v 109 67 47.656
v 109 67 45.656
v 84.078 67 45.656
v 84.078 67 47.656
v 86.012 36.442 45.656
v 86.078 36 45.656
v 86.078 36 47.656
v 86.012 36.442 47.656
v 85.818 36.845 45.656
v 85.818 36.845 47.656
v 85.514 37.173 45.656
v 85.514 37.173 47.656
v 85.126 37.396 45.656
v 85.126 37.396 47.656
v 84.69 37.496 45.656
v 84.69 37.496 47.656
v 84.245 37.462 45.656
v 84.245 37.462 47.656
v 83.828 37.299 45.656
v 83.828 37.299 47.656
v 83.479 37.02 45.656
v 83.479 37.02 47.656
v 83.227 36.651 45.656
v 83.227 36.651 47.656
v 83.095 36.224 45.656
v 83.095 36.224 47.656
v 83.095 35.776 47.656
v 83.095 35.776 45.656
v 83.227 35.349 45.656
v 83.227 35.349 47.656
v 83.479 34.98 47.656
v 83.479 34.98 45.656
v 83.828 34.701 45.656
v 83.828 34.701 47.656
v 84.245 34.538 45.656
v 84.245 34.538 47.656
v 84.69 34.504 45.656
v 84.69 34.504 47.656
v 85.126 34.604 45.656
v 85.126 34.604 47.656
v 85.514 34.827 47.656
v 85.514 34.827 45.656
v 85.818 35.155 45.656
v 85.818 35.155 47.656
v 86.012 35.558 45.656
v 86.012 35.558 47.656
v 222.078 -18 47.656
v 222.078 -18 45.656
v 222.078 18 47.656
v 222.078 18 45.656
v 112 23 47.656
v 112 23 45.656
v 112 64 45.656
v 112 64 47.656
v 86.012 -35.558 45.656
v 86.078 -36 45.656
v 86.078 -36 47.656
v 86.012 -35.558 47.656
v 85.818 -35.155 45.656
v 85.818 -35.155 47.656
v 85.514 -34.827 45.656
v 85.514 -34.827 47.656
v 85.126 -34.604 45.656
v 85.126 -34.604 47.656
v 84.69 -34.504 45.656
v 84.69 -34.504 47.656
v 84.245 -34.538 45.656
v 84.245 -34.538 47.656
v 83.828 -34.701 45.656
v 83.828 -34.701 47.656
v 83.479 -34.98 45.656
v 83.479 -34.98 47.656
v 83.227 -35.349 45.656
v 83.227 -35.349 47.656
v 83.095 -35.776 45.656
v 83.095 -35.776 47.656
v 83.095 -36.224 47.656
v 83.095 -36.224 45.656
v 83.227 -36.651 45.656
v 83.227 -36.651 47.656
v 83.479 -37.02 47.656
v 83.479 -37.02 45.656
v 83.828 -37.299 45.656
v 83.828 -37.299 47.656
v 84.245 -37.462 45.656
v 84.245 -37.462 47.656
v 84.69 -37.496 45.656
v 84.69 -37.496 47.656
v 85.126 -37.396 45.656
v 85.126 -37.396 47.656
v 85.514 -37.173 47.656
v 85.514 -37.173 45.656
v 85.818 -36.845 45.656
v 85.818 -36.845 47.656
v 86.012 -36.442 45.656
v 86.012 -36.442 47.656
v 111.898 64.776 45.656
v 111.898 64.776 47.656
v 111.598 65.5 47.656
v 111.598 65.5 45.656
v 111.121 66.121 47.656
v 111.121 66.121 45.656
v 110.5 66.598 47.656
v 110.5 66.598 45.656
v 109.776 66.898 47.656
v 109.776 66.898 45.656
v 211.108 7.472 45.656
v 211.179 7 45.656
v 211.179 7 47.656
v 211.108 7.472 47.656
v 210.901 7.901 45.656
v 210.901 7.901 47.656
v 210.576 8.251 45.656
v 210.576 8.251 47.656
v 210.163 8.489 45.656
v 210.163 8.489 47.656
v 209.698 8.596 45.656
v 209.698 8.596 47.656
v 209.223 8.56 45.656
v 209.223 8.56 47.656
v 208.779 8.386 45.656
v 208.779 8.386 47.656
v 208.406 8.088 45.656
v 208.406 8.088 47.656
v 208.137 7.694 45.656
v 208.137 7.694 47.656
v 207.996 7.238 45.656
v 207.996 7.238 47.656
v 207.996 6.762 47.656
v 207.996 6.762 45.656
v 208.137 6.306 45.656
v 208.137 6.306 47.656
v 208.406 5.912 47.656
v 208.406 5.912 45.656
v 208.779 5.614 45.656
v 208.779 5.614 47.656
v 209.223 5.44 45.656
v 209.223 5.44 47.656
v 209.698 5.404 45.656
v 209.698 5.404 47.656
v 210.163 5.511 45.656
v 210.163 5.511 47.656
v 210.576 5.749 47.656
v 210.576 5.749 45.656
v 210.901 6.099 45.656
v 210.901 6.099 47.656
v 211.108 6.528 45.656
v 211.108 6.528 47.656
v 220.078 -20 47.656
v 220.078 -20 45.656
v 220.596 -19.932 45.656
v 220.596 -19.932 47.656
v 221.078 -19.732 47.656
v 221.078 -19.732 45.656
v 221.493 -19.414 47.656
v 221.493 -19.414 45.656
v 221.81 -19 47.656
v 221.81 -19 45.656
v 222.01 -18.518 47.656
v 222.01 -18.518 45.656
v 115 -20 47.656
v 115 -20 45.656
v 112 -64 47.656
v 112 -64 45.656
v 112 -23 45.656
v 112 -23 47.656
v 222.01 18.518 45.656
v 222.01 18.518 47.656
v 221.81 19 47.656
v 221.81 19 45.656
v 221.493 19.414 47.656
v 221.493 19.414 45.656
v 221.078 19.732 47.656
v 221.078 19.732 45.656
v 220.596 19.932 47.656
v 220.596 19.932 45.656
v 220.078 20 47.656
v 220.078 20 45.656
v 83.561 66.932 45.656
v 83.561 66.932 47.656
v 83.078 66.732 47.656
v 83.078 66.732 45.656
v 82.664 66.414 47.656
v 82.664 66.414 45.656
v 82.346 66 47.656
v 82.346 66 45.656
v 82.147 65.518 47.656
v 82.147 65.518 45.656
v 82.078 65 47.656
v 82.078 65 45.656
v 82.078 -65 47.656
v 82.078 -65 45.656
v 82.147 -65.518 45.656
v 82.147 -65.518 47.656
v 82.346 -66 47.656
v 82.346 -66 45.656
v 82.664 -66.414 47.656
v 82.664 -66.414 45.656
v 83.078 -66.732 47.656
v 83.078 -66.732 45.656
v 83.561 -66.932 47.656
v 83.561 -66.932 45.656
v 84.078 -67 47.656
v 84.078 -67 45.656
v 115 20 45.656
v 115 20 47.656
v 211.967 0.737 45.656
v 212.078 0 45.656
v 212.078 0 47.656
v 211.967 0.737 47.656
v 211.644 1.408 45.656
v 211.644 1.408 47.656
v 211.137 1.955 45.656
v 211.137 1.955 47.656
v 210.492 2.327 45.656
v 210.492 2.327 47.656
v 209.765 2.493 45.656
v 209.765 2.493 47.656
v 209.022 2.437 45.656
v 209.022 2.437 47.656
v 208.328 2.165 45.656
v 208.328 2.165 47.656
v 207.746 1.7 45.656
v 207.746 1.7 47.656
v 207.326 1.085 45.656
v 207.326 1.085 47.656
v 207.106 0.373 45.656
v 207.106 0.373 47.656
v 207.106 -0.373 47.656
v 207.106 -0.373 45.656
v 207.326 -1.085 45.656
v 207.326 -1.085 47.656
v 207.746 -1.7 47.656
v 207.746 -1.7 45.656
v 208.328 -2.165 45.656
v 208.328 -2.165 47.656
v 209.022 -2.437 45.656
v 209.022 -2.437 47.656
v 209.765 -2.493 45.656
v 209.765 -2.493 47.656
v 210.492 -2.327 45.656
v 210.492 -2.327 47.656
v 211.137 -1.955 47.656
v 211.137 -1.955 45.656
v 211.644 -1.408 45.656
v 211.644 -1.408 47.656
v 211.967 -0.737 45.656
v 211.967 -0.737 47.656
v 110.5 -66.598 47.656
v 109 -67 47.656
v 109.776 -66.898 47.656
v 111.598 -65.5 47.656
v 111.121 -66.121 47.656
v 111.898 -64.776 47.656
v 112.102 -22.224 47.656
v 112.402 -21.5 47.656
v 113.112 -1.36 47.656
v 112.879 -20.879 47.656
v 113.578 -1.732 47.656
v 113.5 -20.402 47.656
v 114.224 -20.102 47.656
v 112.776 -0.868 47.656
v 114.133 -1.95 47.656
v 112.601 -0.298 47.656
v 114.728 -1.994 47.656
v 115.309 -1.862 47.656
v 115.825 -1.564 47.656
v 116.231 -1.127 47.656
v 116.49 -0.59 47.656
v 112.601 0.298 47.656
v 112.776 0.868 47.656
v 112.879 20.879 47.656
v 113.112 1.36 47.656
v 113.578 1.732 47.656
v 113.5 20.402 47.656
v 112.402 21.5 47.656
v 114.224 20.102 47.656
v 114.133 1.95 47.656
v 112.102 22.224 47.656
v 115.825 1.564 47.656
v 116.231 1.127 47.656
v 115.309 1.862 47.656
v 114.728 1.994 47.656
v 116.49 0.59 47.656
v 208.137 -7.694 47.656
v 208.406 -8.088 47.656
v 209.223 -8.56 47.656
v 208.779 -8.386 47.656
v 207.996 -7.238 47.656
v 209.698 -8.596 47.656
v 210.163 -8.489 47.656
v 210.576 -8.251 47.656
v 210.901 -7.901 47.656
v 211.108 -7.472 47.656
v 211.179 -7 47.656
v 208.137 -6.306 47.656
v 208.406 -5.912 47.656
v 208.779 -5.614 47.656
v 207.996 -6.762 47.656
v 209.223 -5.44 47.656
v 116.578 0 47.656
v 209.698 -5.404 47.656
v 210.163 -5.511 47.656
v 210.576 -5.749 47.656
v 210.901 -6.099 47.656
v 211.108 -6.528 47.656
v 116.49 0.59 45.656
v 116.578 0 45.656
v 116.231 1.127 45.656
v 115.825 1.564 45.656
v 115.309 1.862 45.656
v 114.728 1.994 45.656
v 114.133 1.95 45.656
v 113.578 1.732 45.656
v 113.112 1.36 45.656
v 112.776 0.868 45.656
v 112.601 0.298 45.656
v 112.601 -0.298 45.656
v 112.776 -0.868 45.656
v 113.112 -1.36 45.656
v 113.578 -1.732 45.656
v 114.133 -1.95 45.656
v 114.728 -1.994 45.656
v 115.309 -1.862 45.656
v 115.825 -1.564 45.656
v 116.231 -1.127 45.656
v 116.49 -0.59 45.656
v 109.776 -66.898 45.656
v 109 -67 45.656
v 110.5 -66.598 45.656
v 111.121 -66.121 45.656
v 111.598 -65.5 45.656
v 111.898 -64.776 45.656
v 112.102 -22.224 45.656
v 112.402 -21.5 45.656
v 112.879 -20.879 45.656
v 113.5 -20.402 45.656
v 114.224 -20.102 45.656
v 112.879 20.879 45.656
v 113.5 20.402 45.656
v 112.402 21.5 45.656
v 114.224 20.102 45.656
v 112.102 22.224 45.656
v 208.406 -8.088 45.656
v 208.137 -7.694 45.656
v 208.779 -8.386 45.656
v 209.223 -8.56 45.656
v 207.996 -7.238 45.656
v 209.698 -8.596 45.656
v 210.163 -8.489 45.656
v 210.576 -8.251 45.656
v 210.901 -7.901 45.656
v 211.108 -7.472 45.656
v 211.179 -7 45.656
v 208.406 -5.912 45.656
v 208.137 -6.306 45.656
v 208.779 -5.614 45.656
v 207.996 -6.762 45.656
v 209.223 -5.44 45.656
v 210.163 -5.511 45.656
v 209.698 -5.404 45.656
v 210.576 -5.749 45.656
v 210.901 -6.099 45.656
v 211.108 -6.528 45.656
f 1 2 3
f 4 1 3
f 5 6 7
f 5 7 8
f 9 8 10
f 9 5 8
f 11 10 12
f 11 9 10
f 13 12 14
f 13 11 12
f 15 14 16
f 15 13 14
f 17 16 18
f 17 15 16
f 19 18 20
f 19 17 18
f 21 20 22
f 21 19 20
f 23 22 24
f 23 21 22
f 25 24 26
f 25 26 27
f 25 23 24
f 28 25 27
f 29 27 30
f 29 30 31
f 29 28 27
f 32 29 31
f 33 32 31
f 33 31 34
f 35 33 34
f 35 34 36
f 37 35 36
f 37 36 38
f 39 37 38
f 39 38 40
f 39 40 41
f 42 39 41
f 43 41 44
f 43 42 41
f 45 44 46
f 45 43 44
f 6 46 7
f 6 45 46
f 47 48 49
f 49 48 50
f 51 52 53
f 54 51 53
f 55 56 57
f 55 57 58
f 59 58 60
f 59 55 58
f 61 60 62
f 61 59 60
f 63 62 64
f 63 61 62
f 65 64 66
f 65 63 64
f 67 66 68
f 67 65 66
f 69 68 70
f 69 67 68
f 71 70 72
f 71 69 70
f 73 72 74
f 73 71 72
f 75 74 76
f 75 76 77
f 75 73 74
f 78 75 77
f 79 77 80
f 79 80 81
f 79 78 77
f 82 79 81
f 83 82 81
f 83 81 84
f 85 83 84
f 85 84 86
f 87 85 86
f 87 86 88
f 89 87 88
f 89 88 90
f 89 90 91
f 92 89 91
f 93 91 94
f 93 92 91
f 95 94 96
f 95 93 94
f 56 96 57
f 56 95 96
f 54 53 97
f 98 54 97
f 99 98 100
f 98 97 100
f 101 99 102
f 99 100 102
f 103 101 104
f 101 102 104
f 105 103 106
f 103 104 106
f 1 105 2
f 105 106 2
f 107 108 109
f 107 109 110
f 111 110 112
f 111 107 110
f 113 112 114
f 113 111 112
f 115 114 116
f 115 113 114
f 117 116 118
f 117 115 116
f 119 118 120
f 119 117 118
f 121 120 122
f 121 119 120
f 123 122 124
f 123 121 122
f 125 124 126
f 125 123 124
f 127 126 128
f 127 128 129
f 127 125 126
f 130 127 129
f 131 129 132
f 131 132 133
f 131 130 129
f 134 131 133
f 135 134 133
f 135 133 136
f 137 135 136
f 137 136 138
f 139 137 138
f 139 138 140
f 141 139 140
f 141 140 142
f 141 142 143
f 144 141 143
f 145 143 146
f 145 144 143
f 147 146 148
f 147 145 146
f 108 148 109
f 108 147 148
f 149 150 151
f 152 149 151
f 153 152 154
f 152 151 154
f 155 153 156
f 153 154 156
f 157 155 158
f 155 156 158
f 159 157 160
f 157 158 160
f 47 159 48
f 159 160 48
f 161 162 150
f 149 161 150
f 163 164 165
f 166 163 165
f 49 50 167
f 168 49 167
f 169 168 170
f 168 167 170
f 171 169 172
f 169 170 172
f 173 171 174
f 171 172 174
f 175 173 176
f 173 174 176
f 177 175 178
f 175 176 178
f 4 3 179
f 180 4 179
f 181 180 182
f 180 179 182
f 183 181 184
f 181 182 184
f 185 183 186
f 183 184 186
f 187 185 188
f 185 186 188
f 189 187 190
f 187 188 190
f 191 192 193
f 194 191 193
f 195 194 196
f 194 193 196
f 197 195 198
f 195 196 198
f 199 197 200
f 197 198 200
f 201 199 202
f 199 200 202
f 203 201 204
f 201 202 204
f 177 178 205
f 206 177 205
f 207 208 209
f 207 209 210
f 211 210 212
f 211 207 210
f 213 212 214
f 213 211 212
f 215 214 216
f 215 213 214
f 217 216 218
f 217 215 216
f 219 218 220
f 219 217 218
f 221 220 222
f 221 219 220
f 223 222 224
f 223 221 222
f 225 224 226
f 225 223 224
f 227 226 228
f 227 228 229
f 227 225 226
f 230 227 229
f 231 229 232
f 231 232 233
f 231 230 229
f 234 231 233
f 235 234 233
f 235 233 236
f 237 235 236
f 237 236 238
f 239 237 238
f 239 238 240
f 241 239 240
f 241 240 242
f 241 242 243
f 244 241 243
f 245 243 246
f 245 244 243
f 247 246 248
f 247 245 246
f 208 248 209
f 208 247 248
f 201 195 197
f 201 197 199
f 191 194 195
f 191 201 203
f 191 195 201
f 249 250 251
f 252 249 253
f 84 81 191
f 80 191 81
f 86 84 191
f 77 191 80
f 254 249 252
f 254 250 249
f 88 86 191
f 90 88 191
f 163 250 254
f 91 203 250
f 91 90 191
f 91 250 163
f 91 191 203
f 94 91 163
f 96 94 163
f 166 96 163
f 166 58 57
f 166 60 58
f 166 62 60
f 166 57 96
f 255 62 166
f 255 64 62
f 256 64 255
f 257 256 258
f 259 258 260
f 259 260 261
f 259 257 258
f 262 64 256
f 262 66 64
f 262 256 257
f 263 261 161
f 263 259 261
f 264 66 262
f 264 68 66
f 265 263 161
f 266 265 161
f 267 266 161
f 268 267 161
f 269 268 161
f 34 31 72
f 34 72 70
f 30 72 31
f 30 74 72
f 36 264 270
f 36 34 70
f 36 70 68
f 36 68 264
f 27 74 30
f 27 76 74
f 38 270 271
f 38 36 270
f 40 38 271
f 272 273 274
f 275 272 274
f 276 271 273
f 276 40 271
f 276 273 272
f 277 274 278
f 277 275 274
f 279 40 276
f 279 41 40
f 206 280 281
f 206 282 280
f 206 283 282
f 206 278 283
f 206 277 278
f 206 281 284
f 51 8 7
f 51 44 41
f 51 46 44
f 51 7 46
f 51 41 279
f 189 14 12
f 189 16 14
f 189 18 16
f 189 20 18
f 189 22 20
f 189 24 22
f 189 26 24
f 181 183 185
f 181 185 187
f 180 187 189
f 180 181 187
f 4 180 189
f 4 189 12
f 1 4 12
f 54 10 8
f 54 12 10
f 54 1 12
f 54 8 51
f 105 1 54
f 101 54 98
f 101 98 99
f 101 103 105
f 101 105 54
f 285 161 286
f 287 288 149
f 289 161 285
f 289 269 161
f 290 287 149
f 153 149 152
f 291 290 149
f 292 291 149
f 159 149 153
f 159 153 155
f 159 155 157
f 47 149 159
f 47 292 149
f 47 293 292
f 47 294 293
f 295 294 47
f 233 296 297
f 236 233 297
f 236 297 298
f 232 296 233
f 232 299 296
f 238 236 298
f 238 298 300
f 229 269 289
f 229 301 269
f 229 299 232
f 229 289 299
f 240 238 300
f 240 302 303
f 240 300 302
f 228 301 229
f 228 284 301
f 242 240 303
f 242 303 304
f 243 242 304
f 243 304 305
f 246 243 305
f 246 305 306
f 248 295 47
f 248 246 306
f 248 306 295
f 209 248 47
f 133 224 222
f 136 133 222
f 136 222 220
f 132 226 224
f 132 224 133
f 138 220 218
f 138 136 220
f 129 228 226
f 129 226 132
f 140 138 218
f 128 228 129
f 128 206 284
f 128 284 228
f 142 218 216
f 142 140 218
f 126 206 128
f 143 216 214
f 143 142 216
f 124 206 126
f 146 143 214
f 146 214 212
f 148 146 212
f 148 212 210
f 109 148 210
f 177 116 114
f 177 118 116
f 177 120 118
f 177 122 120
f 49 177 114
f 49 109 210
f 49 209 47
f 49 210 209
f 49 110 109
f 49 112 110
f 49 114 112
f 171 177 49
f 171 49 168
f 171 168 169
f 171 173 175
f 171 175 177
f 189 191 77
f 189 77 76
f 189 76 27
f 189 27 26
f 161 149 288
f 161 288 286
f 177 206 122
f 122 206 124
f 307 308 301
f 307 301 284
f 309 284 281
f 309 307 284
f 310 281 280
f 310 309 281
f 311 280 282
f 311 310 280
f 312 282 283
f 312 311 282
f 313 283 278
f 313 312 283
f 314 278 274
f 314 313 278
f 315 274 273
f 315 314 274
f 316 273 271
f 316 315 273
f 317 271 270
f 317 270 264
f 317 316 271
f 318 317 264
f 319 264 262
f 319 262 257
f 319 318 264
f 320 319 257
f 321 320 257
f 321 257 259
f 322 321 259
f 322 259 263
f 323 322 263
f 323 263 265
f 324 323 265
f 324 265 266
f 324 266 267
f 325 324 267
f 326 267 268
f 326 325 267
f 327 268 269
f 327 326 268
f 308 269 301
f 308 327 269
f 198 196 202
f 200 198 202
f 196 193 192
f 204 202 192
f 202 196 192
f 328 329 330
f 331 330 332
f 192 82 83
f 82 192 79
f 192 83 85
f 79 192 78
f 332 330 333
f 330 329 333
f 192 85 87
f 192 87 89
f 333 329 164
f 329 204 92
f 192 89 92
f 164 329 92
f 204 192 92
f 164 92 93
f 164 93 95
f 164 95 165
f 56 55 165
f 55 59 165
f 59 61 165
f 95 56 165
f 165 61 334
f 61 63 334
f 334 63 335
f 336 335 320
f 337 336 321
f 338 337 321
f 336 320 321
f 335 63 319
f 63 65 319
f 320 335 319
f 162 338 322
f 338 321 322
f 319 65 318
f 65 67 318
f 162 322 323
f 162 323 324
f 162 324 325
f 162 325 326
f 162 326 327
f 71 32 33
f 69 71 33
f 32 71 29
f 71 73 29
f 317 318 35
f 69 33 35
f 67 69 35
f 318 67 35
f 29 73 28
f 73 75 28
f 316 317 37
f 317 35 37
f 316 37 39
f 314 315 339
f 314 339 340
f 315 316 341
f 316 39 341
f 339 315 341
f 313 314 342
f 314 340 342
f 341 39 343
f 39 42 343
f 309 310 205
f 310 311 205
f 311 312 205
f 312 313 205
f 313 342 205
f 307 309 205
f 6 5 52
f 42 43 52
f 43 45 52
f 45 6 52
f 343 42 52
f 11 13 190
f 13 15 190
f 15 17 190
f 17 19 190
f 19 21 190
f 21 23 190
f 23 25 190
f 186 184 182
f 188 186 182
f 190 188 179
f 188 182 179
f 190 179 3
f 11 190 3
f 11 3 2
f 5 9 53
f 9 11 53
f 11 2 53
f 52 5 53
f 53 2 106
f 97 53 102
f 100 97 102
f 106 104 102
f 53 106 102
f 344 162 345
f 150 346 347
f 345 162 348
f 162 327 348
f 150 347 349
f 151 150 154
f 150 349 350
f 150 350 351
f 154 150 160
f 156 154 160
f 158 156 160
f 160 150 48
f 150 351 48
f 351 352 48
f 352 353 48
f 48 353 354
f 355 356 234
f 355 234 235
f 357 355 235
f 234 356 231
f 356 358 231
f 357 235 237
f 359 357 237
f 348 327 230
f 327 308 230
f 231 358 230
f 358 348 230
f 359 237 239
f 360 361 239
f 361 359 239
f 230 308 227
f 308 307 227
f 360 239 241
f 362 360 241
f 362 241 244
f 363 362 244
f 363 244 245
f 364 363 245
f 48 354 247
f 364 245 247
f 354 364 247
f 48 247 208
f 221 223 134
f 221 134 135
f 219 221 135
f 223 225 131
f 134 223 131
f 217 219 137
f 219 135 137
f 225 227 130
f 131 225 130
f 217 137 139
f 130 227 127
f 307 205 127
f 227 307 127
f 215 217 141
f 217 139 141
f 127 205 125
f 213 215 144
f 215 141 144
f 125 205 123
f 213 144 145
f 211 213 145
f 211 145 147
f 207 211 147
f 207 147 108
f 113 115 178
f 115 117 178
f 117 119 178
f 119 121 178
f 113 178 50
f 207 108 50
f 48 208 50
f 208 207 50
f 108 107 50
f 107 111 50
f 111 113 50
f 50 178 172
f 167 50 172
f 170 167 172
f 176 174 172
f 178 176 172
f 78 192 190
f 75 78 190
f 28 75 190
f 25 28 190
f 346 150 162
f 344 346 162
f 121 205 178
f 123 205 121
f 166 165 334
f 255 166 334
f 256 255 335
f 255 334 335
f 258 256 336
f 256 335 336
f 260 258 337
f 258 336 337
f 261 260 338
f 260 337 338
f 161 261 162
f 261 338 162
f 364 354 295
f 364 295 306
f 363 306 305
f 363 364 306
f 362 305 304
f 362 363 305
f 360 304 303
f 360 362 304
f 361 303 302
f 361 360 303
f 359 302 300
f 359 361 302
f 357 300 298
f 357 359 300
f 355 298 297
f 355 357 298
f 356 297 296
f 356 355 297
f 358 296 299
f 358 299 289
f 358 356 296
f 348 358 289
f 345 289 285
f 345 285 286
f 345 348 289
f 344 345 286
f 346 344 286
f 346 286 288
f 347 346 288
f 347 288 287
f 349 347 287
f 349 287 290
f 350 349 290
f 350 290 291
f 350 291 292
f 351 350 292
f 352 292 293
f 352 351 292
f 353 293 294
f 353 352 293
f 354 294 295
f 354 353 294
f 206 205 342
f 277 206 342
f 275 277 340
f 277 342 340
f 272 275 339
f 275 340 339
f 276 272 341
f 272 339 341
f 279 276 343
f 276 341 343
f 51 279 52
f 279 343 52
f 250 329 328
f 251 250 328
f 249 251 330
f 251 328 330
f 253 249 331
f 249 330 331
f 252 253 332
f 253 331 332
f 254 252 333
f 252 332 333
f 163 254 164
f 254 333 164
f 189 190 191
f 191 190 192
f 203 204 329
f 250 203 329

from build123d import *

# Parameters (mm, degrees)
EXTRUDE_1_DEPTH     = 2
SKETCH_2_R          = 2.5
SKETCH_2_R_2        = 2
SKETCH_2_R_3        = 1.5
CUT_EXTRUDE_1_DEPTH = 2
SKETCH_3_R          = 1.6
CUT_EXTRUDE_2_DEPTH = 2


with BuildPart() as part:
    # 草图1 → 凸台-拉伸1 (new body)
    with BuildSketch(Plane.XY.offset(45.656070911)):
        with BuildLine():
            Line((82.078378746, 65), (82.078378746, -65))
            ThreePointArc((82.078378746, -65), (82.664165184, -66.414213562), (84.078378746, -67))
            Line((84.078378746, -67), (109, -67))
            ThreePointArc((109, -67), (111.121320344, -66.121320344), (112, -64))
            Line((112, -64), (112, -23))
            ThreePointArc((112, -23), (112.878679656, -20.878679656), (115, -20))
            Line((115, -20), (220.078378746, -20))
            ThreePointArc((220.078378746, -20), (221.492592308, -19.414213562), (222.078378746, -18))
            Line((222.078378746, -18), (222.078378746, 18))
            ThreePointArc((222.078378746, 18), (221.492592308, 19.414213562), (220.078378746, 20))
            Line((220.078378746, 20), (115, 20))
            ThreePointArc((115, 20), (112.878679656, 20.878679656), (112, 23))
            Line((112, 23), (112, 64))
            ThreePointArc((112, 64), (111.121320344, 66.121320344), (109, 67))
            Line((109, 67), (84.078378746, 67))
            ThreePointArc((84.078378746, 67), (82.664165184, 66.414213562), (82.078378746, 65))
        make_face()
    extrude(amount=EXTRUDE_1_DEPTH)

    # 草图2 → 切除-拉伸1 (cut)
    with BuildSketch(Plane.XY.offset(45.656070911)):
        with Locations((209.578378746, 0)):
            Circle(SKETCH_2_R)
        with Locations((114.578378746, 0)):
            Circle(SKETCH_2_R_2)
        with Locations((84.578378746, -36)):
            Circle(SKETCH_2_R_3)
        with Locations((84.578378746, 36)):
            Circle(SKETCH_2_R_3)
    extrude(amount=CUT_EXTRUDE_1_DEPTH, mode=Mode.SUBTRACT)

    # 草图3 → 切除-拉伸2 (cut)
    with BuildSketch(Plane.XY.offset(45.656070911)):
        with Locations((209.57858663, -7)):
            Circle(SKETCH_3_R)
        with Locations((209.57858663, 7)):
            Circle(SKETCH_3_R)
    extrude(amount=CUT_EXTRUDE_2_DEPTH, mode=Mode.SUBTRACT)


solid = part.part
